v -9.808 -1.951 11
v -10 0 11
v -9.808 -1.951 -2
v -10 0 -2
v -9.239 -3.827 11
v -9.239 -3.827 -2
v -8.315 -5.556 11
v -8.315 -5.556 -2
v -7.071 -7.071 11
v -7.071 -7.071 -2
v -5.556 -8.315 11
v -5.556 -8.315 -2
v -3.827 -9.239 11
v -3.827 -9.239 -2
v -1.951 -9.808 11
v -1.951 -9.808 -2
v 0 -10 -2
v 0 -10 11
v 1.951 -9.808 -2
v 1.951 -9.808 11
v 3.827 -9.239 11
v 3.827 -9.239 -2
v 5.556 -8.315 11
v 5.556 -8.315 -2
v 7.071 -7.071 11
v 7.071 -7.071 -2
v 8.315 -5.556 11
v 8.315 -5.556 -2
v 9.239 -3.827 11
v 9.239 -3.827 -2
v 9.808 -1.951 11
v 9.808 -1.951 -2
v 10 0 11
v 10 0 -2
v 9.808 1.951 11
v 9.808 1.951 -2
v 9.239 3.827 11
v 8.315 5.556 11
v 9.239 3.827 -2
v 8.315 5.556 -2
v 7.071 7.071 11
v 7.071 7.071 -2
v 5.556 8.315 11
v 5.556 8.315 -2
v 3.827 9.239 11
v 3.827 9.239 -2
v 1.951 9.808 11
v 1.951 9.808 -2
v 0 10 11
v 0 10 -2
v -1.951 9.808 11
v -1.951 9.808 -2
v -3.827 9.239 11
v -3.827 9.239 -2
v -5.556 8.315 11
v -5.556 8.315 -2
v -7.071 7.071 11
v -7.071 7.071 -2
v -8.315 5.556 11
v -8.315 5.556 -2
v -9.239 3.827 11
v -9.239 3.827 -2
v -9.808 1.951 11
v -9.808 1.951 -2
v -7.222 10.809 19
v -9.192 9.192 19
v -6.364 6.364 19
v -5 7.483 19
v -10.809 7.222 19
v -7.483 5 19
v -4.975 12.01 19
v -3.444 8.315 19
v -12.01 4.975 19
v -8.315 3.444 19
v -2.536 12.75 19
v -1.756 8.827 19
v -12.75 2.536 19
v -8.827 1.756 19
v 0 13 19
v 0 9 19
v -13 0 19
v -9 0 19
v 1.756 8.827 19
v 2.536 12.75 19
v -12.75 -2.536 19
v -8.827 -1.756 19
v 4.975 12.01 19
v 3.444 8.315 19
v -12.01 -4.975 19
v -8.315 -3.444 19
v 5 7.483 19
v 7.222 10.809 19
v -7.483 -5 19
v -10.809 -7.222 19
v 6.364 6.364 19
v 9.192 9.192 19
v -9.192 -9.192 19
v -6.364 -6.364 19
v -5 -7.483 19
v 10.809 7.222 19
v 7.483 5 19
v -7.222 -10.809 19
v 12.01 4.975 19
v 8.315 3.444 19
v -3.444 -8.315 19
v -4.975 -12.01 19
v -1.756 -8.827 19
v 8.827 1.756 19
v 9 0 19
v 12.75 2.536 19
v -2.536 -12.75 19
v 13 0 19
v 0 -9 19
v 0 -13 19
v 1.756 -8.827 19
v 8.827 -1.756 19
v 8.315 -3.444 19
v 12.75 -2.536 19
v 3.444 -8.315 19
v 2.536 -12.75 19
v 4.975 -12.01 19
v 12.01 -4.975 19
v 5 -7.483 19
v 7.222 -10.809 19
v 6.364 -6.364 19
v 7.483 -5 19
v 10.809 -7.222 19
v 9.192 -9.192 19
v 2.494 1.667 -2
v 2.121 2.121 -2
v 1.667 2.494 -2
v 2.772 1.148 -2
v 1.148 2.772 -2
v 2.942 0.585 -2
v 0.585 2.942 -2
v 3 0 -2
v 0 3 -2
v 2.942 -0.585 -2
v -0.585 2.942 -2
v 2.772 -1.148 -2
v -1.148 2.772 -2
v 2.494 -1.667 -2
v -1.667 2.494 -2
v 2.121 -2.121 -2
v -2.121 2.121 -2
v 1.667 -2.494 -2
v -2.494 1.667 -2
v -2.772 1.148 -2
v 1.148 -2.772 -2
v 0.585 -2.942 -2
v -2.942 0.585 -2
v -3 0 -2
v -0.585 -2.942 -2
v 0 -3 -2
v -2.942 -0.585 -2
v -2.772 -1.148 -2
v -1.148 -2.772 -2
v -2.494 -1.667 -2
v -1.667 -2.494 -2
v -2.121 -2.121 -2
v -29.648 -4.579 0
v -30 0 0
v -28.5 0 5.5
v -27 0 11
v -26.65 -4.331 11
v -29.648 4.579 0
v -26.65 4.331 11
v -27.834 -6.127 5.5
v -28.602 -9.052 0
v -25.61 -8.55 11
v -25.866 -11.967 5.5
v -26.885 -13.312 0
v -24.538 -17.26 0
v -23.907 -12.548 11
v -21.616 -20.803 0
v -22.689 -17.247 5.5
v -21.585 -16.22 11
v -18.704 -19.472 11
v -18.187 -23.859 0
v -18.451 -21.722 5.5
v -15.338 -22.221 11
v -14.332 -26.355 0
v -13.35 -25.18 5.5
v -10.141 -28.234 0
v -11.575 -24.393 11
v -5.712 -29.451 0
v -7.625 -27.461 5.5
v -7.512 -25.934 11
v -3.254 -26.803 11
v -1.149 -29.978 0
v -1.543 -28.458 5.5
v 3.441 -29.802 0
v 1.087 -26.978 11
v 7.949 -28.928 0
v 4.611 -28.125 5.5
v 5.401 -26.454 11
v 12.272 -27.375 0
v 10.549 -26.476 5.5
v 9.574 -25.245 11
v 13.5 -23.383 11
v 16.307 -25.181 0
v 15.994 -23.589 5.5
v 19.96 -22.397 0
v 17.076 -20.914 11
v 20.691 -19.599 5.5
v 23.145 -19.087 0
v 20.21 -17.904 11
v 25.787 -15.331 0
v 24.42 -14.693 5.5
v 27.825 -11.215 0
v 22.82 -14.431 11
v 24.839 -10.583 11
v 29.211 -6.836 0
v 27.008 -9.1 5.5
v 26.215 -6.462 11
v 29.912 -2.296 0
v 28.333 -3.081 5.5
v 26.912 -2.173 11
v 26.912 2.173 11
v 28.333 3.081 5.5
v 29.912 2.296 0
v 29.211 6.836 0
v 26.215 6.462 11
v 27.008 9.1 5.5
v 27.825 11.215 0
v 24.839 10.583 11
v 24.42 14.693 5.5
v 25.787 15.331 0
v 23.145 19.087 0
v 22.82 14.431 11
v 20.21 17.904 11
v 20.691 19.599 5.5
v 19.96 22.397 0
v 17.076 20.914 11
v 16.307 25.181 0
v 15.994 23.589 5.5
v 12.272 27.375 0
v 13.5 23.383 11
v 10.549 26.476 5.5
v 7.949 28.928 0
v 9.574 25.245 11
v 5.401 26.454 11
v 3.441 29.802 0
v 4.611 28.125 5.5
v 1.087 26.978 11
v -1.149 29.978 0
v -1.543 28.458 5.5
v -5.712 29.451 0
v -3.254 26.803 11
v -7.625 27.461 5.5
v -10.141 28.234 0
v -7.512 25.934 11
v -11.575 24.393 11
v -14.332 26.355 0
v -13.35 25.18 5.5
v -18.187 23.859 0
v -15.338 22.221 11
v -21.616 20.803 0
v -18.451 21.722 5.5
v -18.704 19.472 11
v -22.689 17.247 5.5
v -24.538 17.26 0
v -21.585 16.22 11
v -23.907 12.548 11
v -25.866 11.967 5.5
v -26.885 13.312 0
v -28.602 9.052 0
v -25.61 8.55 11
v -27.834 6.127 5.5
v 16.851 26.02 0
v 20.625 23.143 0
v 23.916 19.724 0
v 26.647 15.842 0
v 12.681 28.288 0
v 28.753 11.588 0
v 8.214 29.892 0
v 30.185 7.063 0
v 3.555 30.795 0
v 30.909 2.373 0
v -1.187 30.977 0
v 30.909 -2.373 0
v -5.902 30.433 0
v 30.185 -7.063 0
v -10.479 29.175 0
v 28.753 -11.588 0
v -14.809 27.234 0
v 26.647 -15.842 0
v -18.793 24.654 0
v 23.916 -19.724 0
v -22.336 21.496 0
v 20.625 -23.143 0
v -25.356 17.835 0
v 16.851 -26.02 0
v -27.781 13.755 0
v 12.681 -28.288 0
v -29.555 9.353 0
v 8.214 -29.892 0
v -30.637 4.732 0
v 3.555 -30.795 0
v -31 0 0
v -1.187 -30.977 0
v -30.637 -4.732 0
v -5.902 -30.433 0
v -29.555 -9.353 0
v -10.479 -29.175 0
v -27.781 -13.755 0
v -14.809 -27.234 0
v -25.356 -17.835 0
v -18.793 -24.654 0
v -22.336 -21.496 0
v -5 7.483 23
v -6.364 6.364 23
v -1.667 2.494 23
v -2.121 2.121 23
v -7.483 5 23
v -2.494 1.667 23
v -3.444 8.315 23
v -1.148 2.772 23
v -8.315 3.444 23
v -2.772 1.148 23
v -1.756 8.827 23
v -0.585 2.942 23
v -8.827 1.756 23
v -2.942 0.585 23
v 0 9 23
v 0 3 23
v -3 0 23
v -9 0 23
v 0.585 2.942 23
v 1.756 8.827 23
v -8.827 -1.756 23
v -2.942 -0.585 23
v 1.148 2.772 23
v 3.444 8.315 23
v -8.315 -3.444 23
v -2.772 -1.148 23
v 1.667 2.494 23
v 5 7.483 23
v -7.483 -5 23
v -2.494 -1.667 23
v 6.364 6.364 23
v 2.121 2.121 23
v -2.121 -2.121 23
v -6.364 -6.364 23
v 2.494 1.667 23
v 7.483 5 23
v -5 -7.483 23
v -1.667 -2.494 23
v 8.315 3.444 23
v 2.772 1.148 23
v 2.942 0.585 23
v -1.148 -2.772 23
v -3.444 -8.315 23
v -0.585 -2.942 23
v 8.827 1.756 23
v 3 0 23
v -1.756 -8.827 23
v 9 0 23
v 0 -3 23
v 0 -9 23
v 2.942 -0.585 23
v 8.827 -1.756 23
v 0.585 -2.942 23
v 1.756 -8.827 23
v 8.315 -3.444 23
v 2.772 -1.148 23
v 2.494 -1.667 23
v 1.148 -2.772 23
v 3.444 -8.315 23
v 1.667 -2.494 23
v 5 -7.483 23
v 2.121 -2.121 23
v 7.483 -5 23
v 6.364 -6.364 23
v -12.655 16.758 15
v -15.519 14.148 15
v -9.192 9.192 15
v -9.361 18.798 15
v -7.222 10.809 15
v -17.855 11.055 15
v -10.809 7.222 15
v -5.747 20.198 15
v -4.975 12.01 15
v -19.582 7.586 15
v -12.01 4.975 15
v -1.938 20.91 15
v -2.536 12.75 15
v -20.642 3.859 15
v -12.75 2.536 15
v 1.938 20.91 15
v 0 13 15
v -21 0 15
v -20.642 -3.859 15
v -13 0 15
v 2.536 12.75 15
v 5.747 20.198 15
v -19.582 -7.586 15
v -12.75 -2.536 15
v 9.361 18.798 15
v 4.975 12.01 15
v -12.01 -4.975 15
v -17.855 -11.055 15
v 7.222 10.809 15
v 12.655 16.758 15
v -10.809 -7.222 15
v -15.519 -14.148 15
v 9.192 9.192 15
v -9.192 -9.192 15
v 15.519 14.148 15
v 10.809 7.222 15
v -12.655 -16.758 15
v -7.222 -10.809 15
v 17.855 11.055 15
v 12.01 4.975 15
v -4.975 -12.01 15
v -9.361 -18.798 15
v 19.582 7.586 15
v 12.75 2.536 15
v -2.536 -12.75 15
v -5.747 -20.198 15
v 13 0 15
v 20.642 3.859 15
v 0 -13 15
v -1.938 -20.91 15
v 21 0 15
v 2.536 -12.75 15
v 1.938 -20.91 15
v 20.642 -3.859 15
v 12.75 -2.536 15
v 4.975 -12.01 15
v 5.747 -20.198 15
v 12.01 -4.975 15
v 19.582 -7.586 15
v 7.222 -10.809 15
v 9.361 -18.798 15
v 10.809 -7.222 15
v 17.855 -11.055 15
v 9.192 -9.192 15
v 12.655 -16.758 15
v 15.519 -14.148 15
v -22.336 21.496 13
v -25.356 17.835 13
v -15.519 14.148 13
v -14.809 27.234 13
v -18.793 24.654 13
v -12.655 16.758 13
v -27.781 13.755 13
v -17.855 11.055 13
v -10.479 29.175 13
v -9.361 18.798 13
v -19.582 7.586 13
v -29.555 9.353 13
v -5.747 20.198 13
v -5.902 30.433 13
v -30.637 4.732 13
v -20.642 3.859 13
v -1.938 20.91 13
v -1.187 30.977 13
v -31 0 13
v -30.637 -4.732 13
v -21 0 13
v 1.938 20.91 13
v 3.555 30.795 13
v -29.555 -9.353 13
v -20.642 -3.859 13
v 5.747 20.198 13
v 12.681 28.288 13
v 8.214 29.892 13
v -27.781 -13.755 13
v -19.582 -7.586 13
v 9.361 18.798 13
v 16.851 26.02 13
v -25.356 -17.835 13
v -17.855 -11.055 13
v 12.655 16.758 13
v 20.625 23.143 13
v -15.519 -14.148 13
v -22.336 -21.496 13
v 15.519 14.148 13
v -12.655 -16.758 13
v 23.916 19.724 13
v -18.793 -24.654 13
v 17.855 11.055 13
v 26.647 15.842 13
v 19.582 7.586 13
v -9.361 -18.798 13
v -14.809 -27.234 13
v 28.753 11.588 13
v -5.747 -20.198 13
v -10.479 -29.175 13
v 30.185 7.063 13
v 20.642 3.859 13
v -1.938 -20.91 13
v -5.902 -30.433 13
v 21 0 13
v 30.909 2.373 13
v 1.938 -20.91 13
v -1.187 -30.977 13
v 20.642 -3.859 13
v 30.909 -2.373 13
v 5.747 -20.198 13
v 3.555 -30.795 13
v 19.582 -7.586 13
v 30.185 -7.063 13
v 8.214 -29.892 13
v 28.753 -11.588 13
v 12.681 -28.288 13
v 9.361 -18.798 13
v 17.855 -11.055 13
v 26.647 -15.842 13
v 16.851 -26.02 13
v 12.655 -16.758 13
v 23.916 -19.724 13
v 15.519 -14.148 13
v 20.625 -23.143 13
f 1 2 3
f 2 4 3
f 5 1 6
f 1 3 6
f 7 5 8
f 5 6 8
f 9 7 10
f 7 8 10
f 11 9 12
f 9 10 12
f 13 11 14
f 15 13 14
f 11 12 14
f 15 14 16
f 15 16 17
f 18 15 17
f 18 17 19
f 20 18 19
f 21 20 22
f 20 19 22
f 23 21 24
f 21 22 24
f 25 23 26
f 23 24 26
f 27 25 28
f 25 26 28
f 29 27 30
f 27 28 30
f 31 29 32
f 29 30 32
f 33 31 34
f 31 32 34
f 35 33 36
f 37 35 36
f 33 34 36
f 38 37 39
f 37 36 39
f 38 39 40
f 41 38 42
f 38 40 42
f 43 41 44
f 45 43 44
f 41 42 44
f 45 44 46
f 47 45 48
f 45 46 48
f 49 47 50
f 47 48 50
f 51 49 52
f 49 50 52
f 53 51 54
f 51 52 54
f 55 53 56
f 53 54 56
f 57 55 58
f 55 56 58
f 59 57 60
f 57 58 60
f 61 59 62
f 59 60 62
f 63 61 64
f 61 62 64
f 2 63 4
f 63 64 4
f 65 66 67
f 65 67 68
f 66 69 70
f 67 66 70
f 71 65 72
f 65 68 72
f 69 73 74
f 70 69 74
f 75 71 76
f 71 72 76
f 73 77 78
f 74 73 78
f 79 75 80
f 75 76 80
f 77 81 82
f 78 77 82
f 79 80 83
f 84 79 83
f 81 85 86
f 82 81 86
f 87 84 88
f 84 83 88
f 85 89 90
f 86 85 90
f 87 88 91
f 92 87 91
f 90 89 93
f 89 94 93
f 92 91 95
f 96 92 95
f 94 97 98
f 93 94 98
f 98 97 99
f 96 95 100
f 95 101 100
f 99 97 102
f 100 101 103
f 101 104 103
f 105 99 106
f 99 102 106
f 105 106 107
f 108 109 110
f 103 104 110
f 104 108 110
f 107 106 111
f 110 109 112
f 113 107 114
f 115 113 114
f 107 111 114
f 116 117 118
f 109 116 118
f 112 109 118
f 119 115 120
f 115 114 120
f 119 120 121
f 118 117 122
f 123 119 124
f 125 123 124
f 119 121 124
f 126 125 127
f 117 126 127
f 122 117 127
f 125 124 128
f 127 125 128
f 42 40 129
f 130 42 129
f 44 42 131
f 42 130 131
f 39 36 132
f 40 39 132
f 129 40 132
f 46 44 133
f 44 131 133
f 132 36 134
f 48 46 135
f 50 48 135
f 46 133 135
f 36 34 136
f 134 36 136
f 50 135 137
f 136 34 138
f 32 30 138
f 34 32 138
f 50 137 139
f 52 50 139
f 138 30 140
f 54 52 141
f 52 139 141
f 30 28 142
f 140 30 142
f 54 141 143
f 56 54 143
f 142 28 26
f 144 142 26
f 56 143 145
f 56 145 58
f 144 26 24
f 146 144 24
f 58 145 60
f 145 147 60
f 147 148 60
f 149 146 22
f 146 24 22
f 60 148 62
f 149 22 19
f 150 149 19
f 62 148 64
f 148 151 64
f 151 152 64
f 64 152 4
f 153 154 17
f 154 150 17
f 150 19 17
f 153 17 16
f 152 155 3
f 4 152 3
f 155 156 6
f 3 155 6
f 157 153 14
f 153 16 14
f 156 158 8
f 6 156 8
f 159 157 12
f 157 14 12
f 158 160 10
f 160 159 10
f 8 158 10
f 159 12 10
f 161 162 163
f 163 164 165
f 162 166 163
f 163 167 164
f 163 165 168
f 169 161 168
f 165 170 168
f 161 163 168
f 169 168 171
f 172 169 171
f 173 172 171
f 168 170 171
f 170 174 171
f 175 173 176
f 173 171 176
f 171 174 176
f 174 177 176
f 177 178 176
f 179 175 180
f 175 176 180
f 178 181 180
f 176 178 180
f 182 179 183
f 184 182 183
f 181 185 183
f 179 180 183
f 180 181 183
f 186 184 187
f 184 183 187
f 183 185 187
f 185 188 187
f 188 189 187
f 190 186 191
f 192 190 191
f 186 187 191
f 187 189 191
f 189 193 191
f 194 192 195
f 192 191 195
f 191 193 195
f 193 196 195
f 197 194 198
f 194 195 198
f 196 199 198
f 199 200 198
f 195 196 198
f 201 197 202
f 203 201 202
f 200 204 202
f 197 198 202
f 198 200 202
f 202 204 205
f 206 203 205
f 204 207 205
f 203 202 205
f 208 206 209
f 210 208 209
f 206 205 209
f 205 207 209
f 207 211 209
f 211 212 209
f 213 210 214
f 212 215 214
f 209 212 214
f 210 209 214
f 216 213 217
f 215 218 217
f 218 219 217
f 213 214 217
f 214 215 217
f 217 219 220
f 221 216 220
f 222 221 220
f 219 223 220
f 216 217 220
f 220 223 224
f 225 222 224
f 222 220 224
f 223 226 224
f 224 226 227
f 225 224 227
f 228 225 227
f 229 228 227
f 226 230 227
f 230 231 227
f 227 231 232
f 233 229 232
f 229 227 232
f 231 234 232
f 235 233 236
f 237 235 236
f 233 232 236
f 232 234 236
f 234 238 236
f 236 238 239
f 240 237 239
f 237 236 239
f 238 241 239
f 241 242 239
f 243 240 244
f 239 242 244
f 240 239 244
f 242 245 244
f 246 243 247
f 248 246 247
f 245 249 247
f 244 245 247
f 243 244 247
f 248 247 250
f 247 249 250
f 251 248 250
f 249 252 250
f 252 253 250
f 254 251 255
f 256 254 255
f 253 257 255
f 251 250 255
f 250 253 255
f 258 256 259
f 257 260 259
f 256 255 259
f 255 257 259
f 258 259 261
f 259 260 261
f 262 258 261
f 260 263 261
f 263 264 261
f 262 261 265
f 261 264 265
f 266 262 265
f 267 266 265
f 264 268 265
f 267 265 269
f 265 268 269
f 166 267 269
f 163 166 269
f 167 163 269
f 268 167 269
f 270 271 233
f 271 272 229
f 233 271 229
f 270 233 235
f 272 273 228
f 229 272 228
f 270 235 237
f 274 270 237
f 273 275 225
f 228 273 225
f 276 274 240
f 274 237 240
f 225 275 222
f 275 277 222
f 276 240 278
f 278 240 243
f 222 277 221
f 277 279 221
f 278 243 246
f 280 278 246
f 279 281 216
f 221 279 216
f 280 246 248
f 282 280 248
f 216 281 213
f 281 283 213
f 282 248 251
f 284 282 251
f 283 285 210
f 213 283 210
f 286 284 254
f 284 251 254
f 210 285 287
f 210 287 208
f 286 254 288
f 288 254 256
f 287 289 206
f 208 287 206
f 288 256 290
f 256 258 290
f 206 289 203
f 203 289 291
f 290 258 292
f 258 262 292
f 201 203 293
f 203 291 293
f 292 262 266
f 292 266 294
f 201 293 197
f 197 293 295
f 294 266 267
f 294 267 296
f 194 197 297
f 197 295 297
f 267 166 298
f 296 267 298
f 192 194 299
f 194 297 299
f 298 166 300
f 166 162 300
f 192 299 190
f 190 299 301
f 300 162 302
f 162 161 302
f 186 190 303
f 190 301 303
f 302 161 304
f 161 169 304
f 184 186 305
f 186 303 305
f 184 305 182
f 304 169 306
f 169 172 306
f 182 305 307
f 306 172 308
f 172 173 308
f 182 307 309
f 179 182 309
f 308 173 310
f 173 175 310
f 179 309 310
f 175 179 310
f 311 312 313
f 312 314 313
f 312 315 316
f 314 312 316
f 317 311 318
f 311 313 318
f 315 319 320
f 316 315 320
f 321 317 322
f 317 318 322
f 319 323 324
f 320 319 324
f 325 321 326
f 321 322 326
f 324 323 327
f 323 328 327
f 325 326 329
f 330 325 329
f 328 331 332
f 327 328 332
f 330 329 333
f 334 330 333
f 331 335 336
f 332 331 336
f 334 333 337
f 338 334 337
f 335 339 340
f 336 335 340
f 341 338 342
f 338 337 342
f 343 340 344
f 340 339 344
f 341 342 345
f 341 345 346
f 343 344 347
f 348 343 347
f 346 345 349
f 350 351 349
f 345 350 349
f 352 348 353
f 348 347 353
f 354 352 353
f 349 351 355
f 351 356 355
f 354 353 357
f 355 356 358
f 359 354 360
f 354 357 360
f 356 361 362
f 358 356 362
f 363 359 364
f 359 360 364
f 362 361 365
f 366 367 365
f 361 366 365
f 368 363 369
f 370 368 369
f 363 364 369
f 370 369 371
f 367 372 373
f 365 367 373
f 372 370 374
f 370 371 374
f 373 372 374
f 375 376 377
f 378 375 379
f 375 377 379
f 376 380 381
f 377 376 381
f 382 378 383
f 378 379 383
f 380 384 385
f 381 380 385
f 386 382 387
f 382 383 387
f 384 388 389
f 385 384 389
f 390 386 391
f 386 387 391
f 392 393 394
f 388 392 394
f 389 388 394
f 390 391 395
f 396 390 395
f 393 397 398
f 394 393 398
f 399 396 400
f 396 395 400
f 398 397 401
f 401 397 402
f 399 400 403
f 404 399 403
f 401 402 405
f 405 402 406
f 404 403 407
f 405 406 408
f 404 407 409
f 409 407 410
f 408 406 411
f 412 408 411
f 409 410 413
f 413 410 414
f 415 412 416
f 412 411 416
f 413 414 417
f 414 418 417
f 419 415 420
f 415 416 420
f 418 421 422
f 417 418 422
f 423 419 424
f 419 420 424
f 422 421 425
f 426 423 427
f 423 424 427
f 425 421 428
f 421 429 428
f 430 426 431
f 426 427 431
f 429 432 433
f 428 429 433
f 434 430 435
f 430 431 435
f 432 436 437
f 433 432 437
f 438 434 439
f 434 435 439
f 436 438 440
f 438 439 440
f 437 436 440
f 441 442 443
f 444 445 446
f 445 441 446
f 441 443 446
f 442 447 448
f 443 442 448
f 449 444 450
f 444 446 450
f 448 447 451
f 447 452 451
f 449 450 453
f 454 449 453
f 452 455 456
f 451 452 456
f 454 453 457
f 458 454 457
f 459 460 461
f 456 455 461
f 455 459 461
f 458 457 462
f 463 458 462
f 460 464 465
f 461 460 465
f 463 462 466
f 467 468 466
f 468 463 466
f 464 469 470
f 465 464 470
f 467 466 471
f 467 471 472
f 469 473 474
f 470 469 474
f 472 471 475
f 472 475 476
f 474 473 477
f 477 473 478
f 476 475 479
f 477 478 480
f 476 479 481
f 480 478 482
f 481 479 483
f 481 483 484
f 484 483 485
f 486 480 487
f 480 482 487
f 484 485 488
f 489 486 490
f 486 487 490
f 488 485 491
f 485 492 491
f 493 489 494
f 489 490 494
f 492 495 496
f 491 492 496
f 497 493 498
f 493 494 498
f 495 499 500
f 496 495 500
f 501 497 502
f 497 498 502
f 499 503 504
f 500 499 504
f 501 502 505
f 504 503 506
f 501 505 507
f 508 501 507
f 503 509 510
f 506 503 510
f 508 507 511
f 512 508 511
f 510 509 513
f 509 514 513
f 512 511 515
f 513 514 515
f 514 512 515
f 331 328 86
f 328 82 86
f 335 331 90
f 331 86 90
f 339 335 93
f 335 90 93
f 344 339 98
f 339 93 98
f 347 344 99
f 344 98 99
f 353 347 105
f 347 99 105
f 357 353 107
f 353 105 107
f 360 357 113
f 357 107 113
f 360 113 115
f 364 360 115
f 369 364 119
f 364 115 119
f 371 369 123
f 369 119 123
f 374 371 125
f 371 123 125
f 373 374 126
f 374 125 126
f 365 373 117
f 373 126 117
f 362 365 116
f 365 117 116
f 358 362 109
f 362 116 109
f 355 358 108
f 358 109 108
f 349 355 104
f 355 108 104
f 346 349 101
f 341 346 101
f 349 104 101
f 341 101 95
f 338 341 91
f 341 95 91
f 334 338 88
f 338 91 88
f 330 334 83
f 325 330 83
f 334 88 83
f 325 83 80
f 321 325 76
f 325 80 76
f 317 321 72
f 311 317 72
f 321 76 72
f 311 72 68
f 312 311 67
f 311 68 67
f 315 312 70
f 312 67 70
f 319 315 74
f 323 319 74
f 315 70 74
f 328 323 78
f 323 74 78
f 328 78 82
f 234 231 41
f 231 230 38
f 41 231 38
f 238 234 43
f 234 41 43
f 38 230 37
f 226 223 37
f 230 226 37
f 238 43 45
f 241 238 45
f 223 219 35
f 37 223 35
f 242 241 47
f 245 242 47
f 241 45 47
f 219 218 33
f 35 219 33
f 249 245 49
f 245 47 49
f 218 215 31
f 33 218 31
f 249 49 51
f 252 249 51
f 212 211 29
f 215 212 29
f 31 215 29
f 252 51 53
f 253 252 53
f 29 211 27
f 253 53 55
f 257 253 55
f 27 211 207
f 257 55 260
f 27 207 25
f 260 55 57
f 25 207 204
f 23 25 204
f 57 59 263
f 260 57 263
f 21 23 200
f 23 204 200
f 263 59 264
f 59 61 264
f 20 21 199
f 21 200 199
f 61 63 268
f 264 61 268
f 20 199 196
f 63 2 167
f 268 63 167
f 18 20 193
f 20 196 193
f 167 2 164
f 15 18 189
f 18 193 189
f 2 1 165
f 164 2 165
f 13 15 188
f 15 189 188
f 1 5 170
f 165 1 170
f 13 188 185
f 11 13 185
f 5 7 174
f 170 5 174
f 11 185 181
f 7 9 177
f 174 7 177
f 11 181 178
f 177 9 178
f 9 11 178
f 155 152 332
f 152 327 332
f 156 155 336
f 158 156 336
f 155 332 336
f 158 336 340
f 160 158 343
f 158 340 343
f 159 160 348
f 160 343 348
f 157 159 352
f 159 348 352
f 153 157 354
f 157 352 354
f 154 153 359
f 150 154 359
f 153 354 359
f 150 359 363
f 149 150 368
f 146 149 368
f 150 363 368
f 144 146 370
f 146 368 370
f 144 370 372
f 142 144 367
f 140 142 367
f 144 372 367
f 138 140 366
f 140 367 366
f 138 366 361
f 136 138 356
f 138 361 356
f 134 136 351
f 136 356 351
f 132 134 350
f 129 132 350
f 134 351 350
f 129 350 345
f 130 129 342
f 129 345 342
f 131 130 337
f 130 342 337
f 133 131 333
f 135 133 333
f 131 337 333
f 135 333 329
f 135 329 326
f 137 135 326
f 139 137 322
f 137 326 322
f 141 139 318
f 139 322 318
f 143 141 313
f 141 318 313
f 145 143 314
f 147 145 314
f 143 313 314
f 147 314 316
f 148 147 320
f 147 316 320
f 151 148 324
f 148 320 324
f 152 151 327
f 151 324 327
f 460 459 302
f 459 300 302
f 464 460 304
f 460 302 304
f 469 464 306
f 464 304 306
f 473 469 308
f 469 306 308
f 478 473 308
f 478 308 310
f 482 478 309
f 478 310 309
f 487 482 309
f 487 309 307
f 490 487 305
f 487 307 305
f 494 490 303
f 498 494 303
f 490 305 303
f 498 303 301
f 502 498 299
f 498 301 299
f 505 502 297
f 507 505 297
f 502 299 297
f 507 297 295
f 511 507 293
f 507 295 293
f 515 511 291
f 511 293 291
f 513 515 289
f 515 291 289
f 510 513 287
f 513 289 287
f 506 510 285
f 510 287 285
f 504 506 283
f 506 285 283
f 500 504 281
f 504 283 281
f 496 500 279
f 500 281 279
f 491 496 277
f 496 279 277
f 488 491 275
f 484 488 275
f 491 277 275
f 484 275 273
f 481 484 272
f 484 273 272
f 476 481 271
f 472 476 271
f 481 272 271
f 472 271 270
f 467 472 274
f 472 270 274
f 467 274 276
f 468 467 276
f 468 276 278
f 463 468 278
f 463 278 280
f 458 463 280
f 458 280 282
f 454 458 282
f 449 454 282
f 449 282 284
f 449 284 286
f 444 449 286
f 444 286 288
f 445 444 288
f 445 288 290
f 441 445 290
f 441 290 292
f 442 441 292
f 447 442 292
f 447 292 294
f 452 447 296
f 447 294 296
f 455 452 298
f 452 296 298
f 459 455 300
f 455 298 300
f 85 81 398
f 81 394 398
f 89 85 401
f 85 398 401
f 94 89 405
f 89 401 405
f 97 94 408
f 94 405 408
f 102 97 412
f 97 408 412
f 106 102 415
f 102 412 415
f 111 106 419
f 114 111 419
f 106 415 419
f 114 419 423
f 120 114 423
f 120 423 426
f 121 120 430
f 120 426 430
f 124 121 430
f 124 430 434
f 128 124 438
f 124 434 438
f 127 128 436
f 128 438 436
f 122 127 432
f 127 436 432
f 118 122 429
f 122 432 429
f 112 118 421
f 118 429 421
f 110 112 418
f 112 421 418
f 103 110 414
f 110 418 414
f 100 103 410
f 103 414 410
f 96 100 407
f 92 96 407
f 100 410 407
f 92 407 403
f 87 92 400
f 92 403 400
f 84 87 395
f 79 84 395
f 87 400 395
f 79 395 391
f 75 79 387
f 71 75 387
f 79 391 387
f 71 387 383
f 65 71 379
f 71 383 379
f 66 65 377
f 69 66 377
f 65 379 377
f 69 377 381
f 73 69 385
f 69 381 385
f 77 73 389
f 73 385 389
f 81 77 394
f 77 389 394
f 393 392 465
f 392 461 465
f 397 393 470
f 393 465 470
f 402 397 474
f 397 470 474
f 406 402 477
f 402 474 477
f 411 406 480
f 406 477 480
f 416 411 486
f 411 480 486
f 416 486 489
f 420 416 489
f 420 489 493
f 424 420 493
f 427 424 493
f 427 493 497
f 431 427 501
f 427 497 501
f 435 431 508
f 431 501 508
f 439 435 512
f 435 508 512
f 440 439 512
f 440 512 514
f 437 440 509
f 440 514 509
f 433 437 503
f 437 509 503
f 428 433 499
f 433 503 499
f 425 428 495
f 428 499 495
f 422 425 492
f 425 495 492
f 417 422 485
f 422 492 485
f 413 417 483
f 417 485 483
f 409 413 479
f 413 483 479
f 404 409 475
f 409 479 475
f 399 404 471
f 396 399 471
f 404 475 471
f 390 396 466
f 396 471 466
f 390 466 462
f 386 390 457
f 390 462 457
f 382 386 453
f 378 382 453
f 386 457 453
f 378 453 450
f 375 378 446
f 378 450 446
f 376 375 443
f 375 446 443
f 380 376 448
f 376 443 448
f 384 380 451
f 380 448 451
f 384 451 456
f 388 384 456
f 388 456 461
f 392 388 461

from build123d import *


with BuildPart() as part:
    # Croquis1 → Revolución1 (revolve)
    with BuildSketch(Plane(origin=(0, 0, 0), x_dir=(0, 0, -1), z_dir=(1, 0, 0)), mode=Mode.PRIVATE) as revoluci_n1_sk:
        Polygon((2, 3), (-23, 3), (-23, 9), (-19, 9), (-19, 13), (-15, 13), (-15, 21), (-13, 21), (-13, 31), (0, 31), (0, 30), (-11, 27), (-11, 10), (2, 10), align=None)
    revolve(revoluci_n1_sk.sketch.rotate(Axis((0, 0, 0), (0, 0, 1)), 90), axis=Axis((0, 0, 0), (0, 0, 1)))


solid = part.part
